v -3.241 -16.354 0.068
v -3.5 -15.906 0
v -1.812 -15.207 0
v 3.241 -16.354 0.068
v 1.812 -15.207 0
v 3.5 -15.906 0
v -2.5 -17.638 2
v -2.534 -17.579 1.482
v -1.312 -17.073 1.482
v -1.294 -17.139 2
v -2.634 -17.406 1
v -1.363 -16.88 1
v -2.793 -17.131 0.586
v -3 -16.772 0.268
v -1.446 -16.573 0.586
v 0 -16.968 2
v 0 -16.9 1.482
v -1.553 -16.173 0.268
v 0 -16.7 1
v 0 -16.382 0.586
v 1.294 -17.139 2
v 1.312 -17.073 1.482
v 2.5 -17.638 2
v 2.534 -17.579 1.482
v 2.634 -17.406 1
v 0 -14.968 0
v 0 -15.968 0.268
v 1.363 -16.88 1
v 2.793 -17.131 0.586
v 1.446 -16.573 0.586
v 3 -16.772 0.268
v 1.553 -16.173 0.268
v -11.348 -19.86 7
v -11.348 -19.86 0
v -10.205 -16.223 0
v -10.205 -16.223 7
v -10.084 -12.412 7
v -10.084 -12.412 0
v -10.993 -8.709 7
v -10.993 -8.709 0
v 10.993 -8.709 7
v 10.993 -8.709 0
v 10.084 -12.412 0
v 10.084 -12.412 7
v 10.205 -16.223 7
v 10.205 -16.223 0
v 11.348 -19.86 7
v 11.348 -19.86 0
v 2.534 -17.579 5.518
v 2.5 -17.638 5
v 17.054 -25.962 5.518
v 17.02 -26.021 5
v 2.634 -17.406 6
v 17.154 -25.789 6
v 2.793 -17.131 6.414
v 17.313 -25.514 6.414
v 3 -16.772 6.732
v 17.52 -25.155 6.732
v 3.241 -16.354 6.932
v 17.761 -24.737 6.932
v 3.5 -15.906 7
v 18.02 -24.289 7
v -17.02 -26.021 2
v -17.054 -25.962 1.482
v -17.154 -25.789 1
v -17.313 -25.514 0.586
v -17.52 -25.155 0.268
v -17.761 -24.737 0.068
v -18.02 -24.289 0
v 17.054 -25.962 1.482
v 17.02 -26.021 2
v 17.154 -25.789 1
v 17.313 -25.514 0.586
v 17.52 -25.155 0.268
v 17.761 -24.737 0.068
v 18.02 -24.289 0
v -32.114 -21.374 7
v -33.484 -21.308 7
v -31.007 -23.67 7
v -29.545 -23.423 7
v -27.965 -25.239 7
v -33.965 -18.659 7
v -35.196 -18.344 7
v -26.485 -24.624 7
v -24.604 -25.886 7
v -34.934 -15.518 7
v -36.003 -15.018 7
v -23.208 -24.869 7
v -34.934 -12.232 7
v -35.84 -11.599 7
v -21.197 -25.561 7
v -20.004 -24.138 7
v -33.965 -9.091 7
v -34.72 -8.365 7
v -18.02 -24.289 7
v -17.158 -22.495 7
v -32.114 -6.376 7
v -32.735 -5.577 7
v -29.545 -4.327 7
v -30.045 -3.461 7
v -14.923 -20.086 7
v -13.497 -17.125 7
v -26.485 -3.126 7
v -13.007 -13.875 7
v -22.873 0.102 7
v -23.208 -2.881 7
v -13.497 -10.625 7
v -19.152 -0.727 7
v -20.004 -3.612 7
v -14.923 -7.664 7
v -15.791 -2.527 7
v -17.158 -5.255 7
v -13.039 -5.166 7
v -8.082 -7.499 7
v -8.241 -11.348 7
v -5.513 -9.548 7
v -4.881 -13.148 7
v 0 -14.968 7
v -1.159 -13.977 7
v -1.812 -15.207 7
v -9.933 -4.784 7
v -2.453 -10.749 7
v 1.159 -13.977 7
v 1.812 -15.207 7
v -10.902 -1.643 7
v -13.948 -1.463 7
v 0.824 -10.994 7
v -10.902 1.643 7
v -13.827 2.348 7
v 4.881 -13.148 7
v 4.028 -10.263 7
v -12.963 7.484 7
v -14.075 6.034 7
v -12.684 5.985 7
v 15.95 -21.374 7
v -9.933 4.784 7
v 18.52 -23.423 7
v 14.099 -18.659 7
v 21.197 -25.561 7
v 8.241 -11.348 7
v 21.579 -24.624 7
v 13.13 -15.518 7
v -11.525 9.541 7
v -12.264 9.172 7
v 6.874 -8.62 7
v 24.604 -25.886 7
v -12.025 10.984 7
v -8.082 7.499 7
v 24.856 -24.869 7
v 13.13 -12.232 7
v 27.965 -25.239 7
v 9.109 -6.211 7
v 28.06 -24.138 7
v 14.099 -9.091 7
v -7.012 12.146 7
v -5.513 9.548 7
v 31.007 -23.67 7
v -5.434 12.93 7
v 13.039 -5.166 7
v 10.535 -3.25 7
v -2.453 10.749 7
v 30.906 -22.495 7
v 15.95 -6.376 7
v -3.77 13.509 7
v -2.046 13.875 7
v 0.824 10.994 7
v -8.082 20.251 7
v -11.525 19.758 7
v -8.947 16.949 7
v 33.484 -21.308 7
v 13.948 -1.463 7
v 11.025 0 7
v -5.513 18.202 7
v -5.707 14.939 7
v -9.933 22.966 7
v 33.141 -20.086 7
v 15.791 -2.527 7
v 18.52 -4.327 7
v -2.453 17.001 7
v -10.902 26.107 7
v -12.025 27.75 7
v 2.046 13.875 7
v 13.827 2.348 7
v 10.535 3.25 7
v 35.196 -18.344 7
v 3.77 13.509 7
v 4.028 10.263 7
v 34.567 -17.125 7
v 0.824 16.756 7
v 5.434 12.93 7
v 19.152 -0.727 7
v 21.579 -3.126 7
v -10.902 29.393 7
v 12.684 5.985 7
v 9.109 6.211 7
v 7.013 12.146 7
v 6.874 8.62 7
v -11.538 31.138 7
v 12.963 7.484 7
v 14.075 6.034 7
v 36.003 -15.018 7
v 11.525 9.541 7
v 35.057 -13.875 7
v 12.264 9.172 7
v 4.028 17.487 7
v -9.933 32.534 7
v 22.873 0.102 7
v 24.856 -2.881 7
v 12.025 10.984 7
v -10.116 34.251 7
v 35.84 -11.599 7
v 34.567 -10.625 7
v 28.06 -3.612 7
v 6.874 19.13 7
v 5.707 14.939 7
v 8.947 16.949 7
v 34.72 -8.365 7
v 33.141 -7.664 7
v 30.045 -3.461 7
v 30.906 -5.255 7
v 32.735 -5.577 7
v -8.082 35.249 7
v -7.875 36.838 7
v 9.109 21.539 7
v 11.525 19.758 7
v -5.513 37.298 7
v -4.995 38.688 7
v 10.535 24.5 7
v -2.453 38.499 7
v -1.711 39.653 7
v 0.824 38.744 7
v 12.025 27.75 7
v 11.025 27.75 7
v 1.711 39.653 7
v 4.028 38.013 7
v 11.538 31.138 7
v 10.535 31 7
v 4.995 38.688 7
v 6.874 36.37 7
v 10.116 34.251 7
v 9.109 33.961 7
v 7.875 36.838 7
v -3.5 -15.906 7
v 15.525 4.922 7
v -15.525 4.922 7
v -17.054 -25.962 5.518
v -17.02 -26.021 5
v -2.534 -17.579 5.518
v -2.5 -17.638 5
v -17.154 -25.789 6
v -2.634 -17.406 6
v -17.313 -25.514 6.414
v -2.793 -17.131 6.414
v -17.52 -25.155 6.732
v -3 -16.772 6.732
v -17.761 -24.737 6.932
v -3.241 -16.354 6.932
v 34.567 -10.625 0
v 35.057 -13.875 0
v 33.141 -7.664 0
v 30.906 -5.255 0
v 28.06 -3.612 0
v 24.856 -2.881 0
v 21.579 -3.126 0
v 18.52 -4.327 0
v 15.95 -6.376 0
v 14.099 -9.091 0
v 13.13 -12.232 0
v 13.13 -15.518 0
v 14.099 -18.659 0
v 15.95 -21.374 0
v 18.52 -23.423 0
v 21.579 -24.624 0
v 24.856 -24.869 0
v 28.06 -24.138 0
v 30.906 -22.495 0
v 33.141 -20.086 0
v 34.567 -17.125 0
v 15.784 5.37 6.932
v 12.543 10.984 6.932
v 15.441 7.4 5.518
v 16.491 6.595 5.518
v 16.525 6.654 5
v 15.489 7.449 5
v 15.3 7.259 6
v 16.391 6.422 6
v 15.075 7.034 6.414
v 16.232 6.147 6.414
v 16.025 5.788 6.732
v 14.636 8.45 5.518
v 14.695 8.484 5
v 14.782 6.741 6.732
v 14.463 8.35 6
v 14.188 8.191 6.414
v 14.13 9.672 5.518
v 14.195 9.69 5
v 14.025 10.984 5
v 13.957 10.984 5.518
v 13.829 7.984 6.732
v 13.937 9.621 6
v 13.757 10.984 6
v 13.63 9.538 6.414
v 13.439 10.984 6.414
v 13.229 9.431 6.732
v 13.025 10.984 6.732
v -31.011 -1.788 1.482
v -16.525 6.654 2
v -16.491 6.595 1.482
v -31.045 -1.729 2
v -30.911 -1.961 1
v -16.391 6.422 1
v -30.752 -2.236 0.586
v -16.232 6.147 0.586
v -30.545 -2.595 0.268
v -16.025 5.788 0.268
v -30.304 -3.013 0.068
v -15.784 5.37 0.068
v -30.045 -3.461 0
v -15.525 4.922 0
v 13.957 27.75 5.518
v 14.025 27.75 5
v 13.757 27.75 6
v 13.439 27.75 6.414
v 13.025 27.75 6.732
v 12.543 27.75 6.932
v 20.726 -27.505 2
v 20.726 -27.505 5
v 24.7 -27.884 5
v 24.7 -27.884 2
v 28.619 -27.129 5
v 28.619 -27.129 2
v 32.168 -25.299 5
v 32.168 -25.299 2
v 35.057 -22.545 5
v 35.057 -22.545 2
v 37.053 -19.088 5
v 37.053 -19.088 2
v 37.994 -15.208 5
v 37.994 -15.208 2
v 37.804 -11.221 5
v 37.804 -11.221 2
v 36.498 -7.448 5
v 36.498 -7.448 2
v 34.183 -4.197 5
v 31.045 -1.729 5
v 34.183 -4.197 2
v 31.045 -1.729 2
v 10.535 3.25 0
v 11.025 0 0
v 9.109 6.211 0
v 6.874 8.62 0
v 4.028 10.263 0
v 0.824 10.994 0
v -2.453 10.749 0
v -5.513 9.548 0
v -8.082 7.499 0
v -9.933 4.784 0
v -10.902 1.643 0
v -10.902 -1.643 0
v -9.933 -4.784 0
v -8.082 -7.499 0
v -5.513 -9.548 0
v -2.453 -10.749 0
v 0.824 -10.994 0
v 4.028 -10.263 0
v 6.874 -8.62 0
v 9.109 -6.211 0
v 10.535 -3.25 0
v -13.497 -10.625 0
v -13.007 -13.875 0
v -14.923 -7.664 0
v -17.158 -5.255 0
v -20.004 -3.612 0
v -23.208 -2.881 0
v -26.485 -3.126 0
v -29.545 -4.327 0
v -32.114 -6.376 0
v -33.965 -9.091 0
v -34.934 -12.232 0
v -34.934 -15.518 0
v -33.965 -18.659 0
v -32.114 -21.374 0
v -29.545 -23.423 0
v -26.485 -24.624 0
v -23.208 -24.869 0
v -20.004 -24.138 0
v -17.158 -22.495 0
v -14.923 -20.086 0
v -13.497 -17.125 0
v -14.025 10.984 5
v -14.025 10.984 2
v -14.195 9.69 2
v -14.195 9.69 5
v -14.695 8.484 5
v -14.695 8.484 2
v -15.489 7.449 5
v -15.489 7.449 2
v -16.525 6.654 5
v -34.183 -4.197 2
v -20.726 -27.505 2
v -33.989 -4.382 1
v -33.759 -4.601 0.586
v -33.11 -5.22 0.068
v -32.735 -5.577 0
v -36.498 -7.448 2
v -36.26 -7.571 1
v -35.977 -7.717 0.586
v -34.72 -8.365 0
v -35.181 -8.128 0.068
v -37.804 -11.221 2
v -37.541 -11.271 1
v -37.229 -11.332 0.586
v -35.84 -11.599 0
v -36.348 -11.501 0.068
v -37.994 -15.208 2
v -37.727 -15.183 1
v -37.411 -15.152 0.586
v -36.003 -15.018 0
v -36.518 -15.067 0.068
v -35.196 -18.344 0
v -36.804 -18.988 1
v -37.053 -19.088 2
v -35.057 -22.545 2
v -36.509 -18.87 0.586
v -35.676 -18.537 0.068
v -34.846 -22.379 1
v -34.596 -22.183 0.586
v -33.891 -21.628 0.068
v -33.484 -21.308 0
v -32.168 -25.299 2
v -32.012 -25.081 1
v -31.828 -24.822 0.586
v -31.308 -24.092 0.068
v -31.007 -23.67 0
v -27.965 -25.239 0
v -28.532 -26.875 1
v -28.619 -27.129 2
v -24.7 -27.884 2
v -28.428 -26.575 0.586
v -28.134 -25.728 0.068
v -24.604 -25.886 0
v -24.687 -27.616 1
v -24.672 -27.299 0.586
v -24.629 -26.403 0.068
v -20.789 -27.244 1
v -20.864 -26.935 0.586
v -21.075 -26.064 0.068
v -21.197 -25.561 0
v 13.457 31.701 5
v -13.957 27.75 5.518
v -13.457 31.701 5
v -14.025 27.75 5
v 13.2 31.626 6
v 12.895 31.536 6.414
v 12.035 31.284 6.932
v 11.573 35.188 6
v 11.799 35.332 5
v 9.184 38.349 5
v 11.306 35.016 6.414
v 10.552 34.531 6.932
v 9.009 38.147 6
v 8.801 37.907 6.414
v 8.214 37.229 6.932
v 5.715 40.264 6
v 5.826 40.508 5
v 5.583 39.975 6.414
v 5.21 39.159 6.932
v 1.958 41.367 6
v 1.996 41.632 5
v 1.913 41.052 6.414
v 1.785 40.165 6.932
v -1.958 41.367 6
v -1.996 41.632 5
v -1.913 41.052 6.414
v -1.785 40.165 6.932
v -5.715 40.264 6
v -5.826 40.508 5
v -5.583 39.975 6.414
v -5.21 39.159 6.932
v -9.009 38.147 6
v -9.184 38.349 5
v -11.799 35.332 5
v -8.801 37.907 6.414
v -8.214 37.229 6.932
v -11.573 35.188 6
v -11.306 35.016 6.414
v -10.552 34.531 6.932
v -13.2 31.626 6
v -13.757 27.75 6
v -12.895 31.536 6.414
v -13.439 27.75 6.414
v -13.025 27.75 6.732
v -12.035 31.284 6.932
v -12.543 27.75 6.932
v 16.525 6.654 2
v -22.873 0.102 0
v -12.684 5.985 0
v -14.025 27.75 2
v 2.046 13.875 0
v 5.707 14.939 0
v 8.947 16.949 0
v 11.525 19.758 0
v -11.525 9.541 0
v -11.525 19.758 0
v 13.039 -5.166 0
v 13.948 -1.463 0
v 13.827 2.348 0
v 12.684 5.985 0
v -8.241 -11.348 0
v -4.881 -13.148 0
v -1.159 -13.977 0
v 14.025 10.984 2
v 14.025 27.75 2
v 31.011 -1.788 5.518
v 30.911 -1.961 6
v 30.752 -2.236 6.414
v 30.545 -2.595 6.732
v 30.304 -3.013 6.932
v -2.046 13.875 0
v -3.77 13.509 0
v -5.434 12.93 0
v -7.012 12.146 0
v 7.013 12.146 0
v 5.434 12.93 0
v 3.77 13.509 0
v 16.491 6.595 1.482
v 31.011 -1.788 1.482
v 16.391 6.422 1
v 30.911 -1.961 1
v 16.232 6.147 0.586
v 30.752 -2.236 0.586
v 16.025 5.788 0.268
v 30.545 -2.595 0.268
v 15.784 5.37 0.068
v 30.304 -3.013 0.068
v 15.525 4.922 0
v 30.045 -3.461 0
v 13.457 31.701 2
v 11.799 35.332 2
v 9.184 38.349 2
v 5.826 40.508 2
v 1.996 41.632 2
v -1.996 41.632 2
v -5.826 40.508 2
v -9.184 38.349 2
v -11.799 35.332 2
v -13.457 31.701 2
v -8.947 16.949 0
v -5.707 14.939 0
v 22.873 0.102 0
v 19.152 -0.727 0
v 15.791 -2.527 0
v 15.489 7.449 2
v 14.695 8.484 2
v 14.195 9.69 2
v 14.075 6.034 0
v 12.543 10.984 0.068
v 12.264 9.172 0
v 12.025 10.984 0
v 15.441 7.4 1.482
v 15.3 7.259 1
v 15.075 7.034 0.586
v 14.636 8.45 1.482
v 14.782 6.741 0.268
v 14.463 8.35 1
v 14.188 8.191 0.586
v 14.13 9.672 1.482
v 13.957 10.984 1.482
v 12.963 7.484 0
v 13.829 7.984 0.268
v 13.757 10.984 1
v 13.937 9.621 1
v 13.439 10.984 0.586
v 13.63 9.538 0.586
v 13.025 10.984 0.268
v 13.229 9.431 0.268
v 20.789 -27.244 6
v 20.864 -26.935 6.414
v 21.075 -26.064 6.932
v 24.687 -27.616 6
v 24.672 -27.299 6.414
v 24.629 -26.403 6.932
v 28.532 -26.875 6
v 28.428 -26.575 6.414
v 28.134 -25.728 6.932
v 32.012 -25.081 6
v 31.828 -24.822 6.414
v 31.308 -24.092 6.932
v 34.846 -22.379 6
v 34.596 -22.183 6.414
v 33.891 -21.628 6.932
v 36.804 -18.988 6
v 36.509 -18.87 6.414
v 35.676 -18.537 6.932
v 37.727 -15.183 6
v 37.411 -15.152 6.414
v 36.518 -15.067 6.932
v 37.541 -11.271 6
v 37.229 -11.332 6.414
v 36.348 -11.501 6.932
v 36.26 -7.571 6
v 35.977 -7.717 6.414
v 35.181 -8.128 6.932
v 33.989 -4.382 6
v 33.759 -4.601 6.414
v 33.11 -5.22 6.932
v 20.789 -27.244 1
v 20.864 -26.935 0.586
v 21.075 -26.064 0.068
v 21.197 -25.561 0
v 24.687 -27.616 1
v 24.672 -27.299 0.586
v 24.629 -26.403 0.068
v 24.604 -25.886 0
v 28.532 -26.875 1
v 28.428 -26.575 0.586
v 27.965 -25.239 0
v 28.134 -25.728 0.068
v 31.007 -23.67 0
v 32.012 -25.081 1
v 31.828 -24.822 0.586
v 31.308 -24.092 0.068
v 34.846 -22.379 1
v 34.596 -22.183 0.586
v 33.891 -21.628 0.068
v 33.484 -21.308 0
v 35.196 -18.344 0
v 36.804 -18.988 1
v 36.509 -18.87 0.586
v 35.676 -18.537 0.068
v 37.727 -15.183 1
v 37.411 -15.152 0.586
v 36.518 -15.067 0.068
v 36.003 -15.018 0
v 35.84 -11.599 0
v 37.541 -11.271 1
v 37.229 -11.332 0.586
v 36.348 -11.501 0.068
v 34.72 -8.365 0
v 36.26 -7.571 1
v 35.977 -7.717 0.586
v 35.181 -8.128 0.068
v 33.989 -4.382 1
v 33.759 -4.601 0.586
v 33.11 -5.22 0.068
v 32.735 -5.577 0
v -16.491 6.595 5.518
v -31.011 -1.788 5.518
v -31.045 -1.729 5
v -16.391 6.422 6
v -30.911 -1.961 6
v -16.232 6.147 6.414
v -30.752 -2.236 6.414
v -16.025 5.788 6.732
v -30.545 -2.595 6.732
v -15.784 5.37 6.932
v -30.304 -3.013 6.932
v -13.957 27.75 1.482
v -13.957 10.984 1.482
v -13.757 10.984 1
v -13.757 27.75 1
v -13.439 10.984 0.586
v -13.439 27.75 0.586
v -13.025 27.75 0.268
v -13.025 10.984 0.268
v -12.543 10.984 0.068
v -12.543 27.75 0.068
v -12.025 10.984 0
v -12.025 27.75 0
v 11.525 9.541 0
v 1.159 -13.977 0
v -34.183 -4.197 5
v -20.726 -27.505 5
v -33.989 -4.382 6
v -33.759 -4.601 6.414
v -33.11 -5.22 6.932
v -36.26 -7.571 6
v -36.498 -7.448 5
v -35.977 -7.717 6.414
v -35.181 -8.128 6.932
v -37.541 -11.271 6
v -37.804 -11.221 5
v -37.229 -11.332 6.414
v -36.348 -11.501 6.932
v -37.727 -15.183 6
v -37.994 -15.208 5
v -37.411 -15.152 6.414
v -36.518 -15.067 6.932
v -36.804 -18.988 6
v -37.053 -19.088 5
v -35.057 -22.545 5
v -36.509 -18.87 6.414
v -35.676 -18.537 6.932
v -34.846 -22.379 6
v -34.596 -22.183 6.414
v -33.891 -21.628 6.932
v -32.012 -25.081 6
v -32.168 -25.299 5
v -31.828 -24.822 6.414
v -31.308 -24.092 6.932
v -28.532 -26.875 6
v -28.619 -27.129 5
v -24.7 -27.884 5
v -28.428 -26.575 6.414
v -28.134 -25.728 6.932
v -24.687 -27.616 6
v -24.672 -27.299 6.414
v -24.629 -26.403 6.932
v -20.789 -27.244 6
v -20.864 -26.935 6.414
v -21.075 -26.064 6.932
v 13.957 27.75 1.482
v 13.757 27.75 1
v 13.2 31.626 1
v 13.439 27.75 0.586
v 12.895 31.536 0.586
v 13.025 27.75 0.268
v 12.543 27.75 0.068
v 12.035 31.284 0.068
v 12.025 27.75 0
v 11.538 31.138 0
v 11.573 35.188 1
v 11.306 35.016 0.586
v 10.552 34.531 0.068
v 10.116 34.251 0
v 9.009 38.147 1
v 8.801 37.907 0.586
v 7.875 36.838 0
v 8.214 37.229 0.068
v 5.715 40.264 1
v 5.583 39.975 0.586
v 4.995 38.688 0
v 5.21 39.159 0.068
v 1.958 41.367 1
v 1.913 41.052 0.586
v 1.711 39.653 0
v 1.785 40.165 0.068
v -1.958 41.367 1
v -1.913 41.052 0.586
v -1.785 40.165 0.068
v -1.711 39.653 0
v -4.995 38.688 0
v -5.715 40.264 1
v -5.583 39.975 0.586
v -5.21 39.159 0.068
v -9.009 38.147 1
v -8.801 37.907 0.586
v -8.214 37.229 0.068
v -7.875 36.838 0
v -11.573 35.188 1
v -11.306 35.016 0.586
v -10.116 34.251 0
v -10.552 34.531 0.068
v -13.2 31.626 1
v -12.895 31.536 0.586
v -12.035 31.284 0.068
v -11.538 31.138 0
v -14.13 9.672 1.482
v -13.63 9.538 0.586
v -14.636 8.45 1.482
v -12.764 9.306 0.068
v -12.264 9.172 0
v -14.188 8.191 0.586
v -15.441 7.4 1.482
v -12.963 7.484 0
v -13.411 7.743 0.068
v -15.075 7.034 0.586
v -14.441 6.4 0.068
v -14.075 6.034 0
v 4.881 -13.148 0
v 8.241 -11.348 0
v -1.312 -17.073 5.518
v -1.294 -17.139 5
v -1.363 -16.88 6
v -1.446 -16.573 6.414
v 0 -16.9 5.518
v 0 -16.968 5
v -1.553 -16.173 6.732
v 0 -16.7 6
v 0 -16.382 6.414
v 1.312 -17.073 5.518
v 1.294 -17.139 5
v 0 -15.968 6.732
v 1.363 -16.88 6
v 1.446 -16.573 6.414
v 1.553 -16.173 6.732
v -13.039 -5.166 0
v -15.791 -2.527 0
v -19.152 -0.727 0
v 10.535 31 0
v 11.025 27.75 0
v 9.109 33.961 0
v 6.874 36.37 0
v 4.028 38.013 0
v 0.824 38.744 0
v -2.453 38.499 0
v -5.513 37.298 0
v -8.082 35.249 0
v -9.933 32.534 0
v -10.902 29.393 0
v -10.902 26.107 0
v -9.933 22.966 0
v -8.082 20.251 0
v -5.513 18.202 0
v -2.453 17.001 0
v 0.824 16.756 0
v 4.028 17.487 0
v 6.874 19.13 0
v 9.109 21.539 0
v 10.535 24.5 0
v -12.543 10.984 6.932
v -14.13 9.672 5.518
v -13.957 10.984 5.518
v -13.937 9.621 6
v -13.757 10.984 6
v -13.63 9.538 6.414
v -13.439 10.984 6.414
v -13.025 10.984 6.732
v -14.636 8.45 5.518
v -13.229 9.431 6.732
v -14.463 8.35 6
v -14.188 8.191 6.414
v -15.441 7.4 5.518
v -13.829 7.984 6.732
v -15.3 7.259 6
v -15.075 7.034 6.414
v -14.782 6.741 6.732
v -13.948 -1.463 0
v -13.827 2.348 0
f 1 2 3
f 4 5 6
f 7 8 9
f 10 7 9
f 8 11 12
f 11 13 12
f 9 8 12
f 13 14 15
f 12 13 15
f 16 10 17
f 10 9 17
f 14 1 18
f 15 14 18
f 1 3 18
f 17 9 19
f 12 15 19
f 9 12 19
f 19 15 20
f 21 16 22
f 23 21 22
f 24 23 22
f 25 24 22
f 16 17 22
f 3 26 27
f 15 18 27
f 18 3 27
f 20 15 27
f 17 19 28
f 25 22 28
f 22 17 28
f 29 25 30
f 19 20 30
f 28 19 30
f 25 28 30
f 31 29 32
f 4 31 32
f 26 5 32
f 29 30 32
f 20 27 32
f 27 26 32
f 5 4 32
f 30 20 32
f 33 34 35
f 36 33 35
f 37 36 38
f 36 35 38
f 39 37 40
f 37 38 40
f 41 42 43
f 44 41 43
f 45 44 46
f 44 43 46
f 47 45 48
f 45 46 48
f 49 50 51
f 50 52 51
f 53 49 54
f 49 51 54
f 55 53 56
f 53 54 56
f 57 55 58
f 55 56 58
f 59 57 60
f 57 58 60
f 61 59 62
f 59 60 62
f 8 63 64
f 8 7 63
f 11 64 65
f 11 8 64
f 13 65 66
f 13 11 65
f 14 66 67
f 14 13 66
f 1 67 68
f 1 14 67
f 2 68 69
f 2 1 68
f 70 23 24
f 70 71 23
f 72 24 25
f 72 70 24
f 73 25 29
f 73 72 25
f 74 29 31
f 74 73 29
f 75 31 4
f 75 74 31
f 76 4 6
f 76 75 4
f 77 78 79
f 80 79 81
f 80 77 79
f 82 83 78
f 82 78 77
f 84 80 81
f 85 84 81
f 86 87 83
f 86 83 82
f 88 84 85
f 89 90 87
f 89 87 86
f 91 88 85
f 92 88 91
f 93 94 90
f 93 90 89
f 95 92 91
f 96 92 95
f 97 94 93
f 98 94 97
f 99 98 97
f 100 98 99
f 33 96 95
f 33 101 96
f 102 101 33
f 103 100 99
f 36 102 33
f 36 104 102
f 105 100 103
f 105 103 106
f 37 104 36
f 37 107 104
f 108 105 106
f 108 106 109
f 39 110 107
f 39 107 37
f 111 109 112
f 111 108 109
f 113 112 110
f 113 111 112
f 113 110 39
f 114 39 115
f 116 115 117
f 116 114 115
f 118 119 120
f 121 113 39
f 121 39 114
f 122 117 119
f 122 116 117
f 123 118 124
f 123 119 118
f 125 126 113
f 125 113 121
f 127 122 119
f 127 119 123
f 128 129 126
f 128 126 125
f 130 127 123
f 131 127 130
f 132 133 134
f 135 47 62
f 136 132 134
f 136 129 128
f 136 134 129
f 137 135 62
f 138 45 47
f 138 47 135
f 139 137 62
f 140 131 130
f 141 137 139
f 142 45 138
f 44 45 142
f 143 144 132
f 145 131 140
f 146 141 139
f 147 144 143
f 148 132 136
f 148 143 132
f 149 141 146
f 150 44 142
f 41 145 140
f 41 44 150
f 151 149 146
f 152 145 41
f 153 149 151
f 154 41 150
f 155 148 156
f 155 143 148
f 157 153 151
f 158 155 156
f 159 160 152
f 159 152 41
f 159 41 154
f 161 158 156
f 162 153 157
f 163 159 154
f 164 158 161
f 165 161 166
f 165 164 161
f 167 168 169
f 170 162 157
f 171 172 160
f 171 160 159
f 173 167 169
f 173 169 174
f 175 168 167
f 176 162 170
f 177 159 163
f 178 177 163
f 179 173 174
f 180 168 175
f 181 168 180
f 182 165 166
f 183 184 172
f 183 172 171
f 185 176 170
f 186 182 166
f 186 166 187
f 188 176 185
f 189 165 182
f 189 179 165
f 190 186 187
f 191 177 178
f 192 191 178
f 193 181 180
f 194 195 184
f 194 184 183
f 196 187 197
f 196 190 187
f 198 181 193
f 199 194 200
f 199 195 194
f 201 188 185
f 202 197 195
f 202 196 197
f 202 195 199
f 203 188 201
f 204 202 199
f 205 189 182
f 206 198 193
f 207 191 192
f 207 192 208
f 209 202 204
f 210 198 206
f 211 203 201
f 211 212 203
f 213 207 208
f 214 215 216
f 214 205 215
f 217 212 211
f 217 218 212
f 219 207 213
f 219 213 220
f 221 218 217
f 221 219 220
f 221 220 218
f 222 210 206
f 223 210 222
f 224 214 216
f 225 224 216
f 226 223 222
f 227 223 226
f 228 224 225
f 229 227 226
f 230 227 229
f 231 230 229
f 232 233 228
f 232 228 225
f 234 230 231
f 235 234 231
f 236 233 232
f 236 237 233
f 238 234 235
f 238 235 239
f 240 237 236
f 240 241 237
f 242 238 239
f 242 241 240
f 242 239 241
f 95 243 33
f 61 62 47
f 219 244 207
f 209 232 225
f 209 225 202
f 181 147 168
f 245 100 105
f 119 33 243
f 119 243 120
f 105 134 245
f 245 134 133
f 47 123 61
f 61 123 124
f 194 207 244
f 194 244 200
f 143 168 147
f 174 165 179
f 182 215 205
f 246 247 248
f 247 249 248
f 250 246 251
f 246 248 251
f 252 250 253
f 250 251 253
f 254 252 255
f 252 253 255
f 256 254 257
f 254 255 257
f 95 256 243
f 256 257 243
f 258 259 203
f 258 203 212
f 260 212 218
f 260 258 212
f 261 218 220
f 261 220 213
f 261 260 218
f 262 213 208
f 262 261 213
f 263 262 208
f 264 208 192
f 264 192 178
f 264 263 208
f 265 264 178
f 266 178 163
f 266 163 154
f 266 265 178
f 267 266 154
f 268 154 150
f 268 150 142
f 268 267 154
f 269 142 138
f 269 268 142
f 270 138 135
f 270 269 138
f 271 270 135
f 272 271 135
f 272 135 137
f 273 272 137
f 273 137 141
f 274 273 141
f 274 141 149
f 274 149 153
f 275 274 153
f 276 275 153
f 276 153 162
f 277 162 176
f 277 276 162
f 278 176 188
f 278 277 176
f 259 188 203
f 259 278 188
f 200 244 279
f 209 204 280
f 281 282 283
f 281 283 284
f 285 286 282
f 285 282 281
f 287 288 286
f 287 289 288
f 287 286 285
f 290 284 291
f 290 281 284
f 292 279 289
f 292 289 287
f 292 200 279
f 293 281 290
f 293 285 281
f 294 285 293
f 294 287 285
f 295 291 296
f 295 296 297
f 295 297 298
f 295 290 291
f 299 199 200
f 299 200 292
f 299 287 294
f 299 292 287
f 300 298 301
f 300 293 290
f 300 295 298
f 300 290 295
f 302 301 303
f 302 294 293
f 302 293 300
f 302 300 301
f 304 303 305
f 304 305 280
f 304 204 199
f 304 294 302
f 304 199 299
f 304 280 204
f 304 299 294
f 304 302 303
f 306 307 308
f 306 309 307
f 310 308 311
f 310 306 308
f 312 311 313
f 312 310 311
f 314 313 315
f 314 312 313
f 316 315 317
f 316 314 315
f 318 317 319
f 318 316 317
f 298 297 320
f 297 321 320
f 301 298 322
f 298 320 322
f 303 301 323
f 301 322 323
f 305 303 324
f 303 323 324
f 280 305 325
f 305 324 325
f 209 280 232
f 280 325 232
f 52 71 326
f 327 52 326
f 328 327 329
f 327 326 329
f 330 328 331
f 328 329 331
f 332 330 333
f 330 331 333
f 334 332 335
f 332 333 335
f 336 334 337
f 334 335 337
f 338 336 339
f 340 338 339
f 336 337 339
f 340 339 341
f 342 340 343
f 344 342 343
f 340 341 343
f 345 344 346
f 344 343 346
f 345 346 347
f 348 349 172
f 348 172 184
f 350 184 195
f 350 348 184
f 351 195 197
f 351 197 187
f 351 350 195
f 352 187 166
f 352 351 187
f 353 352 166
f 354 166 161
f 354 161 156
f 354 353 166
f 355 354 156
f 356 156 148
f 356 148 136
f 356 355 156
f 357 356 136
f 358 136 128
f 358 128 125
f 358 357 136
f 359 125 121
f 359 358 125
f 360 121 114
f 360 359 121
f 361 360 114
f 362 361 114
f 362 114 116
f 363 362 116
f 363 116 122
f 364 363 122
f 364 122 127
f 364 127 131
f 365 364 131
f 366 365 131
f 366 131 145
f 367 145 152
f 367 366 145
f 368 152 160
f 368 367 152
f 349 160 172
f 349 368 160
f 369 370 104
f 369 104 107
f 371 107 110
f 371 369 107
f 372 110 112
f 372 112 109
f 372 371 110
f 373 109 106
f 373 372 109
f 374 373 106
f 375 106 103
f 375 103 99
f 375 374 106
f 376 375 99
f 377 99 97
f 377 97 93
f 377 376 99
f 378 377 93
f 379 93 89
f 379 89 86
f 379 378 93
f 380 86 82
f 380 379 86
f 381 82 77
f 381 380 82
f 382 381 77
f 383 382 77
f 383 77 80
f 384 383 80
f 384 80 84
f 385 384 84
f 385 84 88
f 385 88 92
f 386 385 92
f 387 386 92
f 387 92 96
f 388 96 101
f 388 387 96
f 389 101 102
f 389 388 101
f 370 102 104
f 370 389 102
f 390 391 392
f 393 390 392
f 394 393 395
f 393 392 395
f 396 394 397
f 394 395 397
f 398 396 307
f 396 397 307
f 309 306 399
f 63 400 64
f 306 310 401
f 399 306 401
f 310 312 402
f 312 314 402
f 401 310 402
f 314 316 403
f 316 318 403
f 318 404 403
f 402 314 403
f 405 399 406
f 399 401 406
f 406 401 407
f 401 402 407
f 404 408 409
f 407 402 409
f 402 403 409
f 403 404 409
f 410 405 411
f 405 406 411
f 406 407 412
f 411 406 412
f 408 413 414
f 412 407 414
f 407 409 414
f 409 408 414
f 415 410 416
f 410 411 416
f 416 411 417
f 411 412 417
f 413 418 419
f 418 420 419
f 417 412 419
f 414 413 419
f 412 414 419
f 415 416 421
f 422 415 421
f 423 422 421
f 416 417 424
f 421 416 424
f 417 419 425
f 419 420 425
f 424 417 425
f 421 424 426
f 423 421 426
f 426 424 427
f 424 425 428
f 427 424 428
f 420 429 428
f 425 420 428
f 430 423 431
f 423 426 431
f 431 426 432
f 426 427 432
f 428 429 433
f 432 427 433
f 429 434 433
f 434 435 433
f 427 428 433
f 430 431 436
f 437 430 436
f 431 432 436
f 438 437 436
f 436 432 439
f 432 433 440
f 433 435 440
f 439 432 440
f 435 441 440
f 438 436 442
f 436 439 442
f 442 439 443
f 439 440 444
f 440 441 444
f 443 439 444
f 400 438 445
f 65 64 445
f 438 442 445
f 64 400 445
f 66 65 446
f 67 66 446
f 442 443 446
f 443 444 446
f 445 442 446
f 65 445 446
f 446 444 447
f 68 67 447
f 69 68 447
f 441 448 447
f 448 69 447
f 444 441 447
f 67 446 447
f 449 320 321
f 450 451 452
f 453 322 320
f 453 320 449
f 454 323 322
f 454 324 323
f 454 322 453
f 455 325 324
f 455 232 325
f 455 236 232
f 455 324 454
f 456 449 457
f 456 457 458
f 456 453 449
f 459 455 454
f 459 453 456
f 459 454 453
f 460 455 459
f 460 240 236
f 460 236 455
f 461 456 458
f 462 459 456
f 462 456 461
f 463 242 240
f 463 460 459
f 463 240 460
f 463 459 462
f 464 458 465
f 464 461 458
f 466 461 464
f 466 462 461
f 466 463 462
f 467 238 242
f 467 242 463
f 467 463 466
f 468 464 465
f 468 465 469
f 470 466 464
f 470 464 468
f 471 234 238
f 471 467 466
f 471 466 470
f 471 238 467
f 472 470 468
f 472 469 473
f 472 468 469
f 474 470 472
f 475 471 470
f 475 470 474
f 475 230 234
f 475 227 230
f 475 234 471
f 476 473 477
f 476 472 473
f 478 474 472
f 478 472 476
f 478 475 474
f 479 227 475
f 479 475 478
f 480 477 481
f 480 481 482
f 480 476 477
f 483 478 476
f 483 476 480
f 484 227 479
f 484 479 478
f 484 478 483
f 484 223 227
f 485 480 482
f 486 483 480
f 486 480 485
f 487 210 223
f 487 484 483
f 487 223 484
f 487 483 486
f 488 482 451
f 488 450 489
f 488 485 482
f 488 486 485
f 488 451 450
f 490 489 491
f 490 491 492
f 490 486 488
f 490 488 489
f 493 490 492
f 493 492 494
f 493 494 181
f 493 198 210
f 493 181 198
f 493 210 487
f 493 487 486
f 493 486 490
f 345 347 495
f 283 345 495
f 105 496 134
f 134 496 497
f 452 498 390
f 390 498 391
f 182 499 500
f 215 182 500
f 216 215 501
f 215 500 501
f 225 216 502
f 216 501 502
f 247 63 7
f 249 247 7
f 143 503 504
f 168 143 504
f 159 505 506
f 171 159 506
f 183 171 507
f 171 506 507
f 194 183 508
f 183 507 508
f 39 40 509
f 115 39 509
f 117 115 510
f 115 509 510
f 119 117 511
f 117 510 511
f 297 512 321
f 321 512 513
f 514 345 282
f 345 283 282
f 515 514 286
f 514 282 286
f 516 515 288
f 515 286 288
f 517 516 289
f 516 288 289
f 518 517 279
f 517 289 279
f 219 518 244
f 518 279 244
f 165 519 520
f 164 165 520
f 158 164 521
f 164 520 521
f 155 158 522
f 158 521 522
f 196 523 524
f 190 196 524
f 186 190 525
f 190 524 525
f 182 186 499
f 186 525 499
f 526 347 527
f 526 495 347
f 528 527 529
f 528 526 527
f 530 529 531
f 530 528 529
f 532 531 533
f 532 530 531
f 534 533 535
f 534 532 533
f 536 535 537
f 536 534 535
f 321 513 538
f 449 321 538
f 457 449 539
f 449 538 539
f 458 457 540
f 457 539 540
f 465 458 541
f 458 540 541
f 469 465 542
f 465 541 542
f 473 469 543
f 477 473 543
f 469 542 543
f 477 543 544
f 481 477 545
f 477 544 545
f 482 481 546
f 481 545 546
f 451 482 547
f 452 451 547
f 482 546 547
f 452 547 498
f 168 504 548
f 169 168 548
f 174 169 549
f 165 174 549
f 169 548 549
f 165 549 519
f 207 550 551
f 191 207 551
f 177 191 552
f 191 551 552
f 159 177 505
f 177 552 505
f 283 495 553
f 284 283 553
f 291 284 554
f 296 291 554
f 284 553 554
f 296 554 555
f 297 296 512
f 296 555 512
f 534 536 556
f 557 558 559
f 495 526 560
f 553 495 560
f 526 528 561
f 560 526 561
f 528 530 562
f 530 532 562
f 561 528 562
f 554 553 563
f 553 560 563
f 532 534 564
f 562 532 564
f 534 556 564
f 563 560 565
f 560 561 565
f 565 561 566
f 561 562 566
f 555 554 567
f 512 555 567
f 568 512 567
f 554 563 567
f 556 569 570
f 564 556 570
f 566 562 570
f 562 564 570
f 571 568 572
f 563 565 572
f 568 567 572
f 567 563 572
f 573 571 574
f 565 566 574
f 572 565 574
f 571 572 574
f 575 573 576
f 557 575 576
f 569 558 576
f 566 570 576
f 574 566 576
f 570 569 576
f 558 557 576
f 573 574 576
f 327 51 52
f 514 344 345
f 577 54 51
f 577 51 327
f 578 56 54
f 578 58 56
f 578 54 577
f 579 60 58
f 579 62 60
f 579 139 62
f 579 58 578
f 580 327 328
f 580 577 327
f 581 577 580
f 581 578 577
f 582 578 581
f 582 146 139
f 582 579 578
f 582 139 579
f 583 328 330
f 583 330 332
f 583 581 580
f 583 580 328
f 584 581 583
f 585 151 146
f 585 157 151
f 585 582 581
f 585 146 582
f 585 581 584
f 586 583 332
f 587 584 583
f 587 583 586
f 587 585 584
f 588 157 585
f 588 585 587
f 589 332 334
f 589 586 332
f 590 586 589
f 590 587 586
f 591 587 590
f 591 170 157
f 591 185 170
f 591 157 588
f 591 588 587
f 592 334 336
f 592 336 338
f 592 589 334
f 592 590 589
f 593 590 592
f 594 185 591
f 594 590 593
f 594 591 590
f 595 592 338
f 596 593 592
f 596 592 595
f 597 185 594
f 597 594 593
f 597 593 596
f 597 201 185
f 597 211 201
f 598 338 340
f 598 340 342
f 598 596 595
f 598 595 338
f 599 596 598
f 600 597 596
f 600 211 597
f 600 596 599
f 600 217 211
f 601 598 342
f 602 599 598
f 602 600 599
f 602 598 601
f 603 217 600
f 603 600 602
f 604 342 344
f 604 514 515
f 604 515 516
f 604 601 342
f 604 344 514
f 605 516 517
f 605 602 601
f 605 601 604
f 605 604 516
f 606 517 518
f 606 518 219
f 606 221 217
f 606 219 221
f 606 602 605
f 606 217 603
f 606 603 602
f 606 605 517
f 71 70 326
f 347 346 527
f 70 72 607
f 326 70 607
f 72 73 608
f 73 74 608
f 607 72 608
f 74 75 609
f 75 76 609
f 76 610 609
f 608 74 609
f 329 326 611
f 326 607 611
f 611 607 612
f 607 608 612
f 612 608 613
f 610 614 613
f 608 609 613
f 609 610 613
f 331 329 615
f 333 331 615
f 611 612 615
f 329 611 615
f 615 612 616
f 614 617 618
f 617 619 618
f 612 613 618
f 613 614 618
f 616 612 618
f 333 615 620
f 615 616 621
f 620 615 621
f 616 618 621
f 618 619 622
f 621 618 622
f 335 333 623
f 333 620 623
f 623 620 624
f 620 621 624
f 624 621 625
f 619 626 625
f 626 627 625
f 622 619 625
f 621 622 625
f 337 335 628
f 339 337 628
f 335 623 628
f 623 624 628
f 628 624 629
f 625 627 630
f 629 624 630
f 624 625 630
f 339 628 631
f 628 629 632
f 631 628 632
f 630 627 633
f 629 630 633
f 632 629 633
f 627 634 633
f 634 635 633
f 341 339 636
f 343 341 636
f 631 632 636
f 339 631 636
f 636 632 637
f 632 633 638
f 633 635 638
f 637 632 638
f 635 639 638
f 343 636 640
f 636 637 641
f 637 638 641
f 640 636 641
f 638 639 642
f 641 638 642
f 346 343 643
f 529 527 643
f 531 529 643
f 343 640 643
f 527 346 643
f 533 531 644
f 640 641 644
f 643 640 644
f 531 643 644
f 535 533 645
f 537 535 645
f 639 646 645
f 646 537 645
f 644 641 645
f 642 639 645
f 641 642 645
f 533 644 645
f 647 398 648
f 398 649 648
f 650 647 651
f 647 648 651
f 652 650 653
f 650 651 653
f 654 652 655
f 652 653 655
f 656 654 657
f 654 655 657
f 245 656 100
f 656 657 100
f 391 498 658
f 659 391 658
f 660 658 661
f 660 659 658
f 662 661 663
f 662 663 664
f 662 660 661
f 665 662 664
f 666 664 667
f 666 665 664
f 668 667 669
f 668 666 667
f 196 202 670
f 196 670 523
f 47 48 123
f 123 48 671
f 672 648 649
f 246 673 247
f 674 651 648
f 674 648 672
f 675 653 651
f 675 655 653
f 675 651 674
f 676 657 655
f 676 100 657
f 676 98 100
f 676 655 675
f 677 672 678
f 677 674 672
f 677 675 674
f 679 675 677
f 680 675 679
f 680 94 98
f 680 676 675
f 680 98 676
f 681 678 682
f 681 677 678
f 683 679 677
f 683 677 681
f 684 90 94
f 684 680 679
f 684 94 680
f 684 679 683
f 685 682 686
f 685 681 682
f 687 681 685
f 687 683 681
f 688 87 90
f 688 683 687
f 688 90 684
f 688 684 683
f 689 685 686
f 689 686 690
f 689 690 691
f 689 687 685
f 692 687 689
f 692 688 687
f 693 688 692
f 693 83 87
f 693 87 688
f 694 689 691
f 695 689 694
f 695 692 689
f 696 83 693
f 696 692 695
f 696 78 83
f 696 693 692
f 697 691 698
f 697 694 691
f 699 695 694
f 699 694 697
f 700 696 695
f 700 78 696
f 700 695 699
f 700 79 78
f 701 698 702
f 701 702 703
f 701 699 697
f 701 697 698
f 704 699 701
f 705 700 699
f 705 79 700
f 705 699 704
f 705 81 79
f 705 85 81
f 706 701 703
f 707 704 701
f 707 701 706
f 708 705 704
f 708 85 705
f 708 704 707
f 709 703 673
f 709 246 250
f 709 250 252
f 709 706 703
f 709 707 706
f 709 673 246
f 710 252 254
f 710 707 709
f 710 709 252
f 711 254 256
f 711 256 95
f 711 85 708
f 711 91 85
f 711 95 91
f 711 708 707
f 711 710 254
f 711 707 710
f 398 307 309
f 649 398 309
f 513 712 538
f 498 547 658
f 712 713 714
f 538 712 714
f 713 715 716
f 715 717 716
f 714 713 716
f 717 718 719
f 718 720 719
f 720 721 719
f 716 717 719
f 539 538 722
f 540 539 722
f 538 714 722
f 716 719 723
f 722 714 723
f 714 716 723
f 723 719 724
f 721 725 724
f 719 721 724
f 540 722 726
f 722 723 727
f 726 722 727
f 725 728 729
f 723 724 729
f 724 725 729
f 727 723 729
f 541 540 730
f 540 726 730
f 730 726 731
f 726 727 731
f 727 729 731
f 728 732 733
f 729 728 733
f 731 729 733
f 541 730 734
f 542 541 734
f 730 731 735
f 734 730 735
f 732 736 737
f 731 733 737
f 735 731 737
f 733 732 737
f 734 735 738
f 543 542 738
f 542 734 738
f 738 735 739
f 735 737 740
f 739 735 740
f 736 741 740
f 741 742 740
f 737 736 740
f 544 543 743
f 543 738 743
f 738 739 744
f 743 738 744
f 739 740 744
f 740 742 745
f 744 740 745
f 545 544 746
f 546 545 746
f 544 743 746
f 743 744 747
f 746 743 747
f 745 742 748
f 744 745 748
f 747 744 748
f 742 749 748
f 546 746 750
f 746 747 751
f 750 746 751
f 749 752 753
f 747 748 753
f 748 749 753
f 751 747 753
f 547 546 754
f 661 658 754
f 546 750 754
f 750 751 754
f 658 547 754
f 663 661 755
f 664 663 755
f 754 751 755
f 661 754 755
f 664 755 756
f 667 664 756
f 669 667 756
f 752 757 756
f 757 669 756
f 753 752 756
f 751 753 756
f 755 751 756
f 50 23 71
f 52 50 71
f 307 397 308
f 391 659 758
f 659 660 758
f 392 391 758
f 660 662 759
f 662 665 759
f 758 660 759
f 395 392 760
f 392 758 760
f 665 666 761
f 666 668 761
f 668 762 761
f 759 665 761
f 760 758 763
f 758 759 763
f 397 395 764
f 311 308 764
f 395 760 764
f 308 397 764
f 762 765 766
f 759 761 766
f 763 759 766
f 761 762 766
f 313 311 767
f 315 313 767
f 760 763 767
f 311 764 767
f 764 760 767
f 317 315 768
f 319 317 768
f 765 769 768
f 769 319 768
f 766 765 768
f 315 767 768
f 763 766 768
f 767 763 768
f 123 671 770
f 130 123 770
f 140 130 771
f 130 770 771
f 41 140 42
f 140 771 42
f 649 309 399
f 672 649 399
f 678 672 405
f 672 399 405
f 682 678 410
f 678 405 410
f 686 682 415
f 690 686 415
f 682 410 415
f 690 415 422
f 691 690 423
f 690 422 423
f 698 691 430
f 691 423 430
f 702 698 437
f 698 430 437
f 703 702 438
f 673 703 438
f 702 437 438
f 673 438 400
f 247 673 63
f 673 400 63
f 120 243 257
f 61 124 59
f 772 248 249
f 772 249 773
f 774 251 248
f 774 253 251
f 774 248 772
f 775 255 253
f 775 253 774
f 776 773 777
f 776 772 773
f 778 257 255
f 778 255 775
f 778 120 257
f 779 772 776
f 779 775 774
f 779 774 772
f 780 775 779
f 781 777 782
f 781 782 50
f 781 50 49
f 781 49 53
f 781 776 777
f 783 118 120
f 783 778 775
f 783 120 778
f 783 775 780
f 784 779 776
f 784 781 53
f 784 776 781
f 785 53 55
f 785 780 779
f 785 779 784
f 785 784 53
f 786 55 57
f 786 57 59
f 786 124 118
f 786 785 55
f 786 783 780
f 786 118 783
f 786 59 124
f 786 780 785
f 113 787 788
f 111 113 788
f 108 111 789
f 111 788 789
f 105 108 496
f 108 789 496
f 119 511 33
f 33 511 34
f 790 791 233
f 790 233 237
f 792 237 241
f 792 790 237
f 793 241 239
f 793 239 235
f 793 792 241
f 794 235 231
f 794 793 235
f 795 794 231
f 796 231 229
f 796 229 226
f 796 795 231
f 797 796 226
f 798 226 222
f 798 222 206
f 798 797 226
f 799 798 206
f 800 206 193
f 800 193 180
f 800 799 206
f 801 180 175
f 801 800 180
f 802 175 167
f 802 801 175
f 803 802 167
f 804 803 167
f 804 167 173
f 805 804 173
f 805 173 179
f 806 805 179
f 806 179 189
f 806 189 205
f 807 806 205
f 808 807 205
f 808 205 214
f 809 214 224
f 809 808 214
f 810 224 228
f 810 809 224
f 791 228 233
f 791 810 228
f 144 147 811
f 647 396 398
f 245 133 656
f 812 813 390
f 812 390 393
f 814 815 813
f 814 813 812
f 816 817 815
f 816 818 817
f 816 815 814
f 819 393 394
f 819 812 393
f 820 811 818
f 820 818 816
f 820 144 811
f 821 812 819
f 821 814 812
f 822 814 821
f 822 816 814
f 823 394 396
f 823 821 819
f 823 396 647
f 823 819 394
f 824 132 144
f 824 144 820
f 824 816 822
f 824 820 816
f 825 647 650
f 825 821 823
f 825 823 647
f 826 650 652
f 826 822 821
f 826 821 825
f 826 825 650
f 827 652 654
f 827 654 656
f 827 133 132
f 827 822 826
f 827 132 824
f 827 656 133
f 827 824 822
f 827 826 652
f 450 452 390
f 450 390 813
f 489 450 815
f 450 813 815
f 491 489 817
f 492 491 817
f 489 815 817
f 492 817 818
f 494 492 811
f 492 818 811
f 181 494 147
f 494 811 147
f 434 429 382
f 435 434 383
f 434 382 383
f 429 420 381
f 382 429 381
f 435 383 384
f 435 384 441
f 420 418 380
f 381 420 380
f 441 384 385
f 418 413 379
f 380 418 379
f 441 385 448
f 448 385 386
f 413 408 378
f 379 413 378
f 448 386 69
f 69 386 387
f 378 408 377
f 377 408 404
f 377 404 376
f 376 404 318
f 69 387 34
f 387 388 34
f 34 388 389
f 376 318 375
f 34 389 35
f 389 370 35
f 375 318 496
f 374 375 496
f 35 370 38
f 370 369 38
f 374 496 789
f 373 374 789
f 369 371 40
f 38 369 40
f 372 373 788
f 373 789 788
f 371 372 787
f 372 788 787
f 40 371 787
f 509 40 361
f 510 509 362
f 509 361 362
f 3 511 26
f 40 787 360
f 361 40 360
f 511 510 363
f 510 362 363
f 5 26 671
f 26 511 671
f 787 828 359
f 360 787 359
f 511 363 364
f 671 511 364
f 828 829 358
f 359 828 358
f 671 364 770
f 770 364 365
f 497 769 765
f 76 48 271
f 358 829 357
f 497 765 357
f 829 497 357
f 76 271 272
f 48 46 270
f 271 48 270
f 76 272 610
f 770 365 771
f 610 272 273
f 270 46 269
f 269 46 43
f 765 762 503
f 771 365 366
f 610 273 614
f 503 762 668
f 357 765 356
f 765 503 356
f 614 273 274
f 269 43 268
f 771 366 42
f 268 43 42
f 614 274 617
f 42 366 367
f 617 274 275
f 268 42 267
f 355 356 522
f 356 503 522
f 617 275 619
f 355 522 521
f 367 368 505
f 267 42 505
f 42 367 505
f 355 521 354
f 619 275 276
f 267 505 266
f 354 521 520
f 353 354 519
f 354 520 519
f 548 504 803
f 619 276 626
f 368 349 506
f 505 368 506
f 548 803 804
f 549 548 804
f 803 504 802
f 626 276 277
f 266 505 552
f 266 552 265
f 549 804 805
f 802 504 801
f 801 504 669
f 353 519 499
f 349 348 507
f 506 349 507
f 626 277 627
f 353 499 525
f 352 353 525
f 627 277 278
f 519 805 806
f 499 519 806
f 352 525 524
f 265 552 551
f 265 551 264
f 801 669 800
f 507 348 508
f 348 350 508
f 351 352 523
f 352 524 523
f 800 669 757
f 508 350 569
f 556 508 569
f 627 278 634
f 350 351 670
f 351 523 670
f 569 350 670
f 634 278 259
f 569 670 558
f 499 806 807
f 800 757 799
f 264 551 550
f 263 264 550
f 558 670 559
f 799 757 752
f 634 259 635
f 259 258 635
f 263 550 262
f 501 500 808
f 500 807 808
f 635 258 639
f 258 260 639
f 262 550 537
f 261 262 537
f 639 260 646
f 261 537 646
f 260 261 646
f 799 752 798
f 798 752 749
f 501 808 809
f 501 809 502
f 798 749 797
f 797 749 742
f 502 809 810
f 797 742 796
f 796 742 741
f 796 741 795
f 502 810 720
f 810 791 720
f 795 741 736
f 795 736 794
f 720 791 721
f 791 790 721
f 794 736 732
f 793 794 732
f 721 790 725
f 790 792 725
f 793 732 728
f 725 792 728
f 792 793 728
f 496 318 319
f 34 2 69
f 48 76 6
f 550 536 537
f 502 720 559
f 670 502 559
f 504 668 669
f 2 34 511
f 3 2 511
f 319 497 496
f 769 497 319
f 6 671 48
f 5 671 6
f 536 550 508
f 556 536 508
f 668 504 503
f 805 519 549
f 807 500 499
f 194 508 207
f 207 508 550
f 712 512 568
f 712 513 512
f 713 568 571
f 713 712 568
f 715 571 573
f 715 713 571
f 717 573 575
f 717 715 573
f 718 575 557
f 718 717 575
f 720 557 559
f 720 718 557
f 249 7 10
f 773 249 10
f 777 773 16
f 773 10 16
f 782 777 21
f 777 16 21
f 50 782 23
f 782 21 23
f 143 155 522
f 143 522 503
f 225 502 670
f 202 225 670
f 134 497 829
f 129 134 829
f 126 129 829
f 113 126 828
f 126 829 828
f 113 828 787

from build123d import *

# Parameters (mm, degrees)
F0_R     = 11.025
F1_DEPTH = 7
F2_R     = 2


with BuildPart() as f1:
    # F0 (on Top) → F1 (new body)
    with BuildSketch(Plane.XY):
        with BuildLine():
            ThreePointArc((14.025, 27.75), (0, 41.775), (-14.025, 27.75))
            Line((-14.025, 27.75), (-14.025, 10.984089))
            ThreePointArc((-14.025, 10.984089), (-14.694873, 8.484089), (-16.525, 6.653962))
            Line((-16.525, 6.653962), (-31.044705, -1.728994))
            ThreePointArc((-31.044705, -1.728994), (-36.178211, -20.8875), (-17.019705, -26.021006))
            Line((-17.019705, -26.021006), (-2.5, -17.638051))
            ThreePointArc((-2.5, -17.638051), (0, -16.968178), (2.5, -17.638051))
            Line((2.5, -17.638051), (17.019705, -26.021006))
            ThreePointArc((17.019705, -26.021006), (36.178211, -20.8875), (31.044705, -1.728994))
            Line((31.044705, -1.728994), (16.525, 6.653962))
            ThreePointArc((16.525, 6.653962), (14.694873, 8.484089), (14.025, 10.984089))
            Line((14.025, 10.984089), (14.025, 27.75))
        make_face()
        with Locations((-24.032205, -13.875)):
            Circle(F0_R, mode=Mode.SUBTRACT)
        with BuildLine():
            Line((-1.158934, -13.977035), (-11.348271, -19.859851))
            ThreePointArc((-11.348271, -19.859851), (-10.014308, -14.321322), (-10.993239, -8.709152))
            ThreePointArc((-10.993239, -8.709152), (-6.622422, -12.363015), (-1.158934, -13.977035))
        make_face(mode=Mode.SUBTRACT)
        with BuildLine():
            ThreePointArc((-12.683934, 5.984851), (-14.017896, 0.446322), (-13.038966, -5.165848))
            ThreePointArc((-13.038966, -5.165848), (-17.409783, -1.511985), (-22.873271, 0.102035))
            Line((-22.873271, 0.102035), (-12.683934, 5.984851))
        make_face(mode=Mode.SUBTRACT)
        with BuildLine():
            ThreePointArc((1.158934, -13.977035), (6.622422, -12.363015), (10.993239, -8.709152))
            ThreePointArc((10.993239, -8.709152), (10.014308, -14.321322), (11.348271, -19.859851))
            Line((11.348271, -19.859851), (1.158934, -13.977035))
        make_face(mode=Mode.SUBTRACT)
        with Locations((24.032205, -13.875)):
            Circle(F0_R, mode=Mode.SUBTRACT)
        Circle(F0_R, mode=Mode.SUBTRACT)
        with BuildLine():
            Line((12.683934, 5.984851), (22.873271, 0.102035))
            ThreePointArc((22.873271, 0.102035), (17.409783, -1.511985), (13.038966, -5.165848))
            ThreePointArc((13.038966, -5.165848), (14.017896, 0.446322), (12.683934, 5.984851))
        make_face(mode=Mode.SUBTRACT)
        with BuildLine():
            ThreePointArc((-11.525, 19.757816), (-7.395474, 15.833307), (-2.045727, 13.875))
            ThreePointArc((-2.045727, 13.875), (-4.610881, 13.245392), (-7.0125, 12.146006))
            Line((-7.0125, 12.146006), (-11.525, 9.540713))
            Line((-11.525, 9.540713), (-11.525, 19.757816))
        make_face(mode=Mode.SUBTRACT)
        with BuildLine():
            ThreePointArc((7.0125, 12.146006), (4.610881, 13.245392), (2.045727, 13.875))
            ThreePointArc((2.045727, 13.875), (7.395474, 15.833307), (11.525, 19.757816))
            Line((11.525, 19.757816), (11.525, 9.540713))
            Line((11.525, 9.540713), (7.0125, 12.146006))
        make_face(mode=Mode.SUBTRACT)
        with Locations((0, 27.75)):
            Circle(F0_R, mode=Mode.SUBTRACT)
    extrude(amount=F1_DEPTH)

    # F2
    f2_edges = [f1.edges().sort_by_distance(p)[0] for p in [
        (-36.178211, -20.8875, 7),
        (-9.759852, -21.829529, 7),
        (0, -16.968178, 7),
        (9.759852, -21.829529, 7),
        (36.178211, -20.8875, 7),
        (23.784852, 2.462484, 7),
        (14.694873, 8.484089, 7),
        (-23.784852, 2.462484, 7),
        (-14.694873, 8.484089, 7),
        (0, 41.775, 7),
        (14.025, 19.367044, 7),
        (-23.784852, 2.462484, 0),
        (-36.178211, -20.8875, 0),
    ]]
    fillet(f2_edges, radius=F2_R)


solid = f1.part
